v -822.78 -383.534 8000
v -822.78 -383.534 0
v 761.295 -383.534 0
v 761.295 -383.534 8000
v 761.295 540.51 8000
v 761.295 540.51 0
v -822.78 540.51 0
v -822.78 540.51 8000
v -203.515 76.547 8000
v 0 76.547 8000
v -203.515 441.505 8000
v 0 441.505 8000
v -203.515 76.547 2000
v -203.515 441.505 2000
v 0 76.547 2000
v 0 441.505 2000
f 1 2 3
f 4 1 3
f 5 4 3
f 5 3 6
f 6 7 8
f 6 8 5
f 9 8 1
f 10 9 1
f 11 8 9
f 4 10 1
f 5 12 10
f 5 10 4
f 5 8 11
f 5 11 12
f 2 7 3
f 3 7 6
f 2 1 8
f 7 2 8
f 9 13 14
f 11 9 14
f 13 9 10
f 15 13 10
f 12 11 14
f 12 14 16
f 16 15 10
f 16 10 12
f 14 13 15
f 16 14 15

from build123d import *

# Parameters (mm, degrees)
F1_W     = 1584.075571
F1_H     = 924.044102
F2_DEPTH = 8000
F3_W     = 203.515396
F3_H     = 364.958607
F4_DEPTH = 6000


with BuildPart() as f2:
    # F1 (on face) → F2 (new body)
    with BuildSketch(Plane.XY):
        with Locations((-30.742467, 78.487888)):
            Rectangle(F1_W, F1_H)
    extrude(amount=F2_DEPTH)

    # F3 (on face) → F4 (cut)
    with BuildSketch(Plane.XY.offset(8000)):
        with Locations((-101.757698, 259.02592)):
            Rectangle(F3_W, F3_H)
    extrude(amount=-F4_DEPTH, mode=Mode.SUBTRACT)


solid = f2.part
